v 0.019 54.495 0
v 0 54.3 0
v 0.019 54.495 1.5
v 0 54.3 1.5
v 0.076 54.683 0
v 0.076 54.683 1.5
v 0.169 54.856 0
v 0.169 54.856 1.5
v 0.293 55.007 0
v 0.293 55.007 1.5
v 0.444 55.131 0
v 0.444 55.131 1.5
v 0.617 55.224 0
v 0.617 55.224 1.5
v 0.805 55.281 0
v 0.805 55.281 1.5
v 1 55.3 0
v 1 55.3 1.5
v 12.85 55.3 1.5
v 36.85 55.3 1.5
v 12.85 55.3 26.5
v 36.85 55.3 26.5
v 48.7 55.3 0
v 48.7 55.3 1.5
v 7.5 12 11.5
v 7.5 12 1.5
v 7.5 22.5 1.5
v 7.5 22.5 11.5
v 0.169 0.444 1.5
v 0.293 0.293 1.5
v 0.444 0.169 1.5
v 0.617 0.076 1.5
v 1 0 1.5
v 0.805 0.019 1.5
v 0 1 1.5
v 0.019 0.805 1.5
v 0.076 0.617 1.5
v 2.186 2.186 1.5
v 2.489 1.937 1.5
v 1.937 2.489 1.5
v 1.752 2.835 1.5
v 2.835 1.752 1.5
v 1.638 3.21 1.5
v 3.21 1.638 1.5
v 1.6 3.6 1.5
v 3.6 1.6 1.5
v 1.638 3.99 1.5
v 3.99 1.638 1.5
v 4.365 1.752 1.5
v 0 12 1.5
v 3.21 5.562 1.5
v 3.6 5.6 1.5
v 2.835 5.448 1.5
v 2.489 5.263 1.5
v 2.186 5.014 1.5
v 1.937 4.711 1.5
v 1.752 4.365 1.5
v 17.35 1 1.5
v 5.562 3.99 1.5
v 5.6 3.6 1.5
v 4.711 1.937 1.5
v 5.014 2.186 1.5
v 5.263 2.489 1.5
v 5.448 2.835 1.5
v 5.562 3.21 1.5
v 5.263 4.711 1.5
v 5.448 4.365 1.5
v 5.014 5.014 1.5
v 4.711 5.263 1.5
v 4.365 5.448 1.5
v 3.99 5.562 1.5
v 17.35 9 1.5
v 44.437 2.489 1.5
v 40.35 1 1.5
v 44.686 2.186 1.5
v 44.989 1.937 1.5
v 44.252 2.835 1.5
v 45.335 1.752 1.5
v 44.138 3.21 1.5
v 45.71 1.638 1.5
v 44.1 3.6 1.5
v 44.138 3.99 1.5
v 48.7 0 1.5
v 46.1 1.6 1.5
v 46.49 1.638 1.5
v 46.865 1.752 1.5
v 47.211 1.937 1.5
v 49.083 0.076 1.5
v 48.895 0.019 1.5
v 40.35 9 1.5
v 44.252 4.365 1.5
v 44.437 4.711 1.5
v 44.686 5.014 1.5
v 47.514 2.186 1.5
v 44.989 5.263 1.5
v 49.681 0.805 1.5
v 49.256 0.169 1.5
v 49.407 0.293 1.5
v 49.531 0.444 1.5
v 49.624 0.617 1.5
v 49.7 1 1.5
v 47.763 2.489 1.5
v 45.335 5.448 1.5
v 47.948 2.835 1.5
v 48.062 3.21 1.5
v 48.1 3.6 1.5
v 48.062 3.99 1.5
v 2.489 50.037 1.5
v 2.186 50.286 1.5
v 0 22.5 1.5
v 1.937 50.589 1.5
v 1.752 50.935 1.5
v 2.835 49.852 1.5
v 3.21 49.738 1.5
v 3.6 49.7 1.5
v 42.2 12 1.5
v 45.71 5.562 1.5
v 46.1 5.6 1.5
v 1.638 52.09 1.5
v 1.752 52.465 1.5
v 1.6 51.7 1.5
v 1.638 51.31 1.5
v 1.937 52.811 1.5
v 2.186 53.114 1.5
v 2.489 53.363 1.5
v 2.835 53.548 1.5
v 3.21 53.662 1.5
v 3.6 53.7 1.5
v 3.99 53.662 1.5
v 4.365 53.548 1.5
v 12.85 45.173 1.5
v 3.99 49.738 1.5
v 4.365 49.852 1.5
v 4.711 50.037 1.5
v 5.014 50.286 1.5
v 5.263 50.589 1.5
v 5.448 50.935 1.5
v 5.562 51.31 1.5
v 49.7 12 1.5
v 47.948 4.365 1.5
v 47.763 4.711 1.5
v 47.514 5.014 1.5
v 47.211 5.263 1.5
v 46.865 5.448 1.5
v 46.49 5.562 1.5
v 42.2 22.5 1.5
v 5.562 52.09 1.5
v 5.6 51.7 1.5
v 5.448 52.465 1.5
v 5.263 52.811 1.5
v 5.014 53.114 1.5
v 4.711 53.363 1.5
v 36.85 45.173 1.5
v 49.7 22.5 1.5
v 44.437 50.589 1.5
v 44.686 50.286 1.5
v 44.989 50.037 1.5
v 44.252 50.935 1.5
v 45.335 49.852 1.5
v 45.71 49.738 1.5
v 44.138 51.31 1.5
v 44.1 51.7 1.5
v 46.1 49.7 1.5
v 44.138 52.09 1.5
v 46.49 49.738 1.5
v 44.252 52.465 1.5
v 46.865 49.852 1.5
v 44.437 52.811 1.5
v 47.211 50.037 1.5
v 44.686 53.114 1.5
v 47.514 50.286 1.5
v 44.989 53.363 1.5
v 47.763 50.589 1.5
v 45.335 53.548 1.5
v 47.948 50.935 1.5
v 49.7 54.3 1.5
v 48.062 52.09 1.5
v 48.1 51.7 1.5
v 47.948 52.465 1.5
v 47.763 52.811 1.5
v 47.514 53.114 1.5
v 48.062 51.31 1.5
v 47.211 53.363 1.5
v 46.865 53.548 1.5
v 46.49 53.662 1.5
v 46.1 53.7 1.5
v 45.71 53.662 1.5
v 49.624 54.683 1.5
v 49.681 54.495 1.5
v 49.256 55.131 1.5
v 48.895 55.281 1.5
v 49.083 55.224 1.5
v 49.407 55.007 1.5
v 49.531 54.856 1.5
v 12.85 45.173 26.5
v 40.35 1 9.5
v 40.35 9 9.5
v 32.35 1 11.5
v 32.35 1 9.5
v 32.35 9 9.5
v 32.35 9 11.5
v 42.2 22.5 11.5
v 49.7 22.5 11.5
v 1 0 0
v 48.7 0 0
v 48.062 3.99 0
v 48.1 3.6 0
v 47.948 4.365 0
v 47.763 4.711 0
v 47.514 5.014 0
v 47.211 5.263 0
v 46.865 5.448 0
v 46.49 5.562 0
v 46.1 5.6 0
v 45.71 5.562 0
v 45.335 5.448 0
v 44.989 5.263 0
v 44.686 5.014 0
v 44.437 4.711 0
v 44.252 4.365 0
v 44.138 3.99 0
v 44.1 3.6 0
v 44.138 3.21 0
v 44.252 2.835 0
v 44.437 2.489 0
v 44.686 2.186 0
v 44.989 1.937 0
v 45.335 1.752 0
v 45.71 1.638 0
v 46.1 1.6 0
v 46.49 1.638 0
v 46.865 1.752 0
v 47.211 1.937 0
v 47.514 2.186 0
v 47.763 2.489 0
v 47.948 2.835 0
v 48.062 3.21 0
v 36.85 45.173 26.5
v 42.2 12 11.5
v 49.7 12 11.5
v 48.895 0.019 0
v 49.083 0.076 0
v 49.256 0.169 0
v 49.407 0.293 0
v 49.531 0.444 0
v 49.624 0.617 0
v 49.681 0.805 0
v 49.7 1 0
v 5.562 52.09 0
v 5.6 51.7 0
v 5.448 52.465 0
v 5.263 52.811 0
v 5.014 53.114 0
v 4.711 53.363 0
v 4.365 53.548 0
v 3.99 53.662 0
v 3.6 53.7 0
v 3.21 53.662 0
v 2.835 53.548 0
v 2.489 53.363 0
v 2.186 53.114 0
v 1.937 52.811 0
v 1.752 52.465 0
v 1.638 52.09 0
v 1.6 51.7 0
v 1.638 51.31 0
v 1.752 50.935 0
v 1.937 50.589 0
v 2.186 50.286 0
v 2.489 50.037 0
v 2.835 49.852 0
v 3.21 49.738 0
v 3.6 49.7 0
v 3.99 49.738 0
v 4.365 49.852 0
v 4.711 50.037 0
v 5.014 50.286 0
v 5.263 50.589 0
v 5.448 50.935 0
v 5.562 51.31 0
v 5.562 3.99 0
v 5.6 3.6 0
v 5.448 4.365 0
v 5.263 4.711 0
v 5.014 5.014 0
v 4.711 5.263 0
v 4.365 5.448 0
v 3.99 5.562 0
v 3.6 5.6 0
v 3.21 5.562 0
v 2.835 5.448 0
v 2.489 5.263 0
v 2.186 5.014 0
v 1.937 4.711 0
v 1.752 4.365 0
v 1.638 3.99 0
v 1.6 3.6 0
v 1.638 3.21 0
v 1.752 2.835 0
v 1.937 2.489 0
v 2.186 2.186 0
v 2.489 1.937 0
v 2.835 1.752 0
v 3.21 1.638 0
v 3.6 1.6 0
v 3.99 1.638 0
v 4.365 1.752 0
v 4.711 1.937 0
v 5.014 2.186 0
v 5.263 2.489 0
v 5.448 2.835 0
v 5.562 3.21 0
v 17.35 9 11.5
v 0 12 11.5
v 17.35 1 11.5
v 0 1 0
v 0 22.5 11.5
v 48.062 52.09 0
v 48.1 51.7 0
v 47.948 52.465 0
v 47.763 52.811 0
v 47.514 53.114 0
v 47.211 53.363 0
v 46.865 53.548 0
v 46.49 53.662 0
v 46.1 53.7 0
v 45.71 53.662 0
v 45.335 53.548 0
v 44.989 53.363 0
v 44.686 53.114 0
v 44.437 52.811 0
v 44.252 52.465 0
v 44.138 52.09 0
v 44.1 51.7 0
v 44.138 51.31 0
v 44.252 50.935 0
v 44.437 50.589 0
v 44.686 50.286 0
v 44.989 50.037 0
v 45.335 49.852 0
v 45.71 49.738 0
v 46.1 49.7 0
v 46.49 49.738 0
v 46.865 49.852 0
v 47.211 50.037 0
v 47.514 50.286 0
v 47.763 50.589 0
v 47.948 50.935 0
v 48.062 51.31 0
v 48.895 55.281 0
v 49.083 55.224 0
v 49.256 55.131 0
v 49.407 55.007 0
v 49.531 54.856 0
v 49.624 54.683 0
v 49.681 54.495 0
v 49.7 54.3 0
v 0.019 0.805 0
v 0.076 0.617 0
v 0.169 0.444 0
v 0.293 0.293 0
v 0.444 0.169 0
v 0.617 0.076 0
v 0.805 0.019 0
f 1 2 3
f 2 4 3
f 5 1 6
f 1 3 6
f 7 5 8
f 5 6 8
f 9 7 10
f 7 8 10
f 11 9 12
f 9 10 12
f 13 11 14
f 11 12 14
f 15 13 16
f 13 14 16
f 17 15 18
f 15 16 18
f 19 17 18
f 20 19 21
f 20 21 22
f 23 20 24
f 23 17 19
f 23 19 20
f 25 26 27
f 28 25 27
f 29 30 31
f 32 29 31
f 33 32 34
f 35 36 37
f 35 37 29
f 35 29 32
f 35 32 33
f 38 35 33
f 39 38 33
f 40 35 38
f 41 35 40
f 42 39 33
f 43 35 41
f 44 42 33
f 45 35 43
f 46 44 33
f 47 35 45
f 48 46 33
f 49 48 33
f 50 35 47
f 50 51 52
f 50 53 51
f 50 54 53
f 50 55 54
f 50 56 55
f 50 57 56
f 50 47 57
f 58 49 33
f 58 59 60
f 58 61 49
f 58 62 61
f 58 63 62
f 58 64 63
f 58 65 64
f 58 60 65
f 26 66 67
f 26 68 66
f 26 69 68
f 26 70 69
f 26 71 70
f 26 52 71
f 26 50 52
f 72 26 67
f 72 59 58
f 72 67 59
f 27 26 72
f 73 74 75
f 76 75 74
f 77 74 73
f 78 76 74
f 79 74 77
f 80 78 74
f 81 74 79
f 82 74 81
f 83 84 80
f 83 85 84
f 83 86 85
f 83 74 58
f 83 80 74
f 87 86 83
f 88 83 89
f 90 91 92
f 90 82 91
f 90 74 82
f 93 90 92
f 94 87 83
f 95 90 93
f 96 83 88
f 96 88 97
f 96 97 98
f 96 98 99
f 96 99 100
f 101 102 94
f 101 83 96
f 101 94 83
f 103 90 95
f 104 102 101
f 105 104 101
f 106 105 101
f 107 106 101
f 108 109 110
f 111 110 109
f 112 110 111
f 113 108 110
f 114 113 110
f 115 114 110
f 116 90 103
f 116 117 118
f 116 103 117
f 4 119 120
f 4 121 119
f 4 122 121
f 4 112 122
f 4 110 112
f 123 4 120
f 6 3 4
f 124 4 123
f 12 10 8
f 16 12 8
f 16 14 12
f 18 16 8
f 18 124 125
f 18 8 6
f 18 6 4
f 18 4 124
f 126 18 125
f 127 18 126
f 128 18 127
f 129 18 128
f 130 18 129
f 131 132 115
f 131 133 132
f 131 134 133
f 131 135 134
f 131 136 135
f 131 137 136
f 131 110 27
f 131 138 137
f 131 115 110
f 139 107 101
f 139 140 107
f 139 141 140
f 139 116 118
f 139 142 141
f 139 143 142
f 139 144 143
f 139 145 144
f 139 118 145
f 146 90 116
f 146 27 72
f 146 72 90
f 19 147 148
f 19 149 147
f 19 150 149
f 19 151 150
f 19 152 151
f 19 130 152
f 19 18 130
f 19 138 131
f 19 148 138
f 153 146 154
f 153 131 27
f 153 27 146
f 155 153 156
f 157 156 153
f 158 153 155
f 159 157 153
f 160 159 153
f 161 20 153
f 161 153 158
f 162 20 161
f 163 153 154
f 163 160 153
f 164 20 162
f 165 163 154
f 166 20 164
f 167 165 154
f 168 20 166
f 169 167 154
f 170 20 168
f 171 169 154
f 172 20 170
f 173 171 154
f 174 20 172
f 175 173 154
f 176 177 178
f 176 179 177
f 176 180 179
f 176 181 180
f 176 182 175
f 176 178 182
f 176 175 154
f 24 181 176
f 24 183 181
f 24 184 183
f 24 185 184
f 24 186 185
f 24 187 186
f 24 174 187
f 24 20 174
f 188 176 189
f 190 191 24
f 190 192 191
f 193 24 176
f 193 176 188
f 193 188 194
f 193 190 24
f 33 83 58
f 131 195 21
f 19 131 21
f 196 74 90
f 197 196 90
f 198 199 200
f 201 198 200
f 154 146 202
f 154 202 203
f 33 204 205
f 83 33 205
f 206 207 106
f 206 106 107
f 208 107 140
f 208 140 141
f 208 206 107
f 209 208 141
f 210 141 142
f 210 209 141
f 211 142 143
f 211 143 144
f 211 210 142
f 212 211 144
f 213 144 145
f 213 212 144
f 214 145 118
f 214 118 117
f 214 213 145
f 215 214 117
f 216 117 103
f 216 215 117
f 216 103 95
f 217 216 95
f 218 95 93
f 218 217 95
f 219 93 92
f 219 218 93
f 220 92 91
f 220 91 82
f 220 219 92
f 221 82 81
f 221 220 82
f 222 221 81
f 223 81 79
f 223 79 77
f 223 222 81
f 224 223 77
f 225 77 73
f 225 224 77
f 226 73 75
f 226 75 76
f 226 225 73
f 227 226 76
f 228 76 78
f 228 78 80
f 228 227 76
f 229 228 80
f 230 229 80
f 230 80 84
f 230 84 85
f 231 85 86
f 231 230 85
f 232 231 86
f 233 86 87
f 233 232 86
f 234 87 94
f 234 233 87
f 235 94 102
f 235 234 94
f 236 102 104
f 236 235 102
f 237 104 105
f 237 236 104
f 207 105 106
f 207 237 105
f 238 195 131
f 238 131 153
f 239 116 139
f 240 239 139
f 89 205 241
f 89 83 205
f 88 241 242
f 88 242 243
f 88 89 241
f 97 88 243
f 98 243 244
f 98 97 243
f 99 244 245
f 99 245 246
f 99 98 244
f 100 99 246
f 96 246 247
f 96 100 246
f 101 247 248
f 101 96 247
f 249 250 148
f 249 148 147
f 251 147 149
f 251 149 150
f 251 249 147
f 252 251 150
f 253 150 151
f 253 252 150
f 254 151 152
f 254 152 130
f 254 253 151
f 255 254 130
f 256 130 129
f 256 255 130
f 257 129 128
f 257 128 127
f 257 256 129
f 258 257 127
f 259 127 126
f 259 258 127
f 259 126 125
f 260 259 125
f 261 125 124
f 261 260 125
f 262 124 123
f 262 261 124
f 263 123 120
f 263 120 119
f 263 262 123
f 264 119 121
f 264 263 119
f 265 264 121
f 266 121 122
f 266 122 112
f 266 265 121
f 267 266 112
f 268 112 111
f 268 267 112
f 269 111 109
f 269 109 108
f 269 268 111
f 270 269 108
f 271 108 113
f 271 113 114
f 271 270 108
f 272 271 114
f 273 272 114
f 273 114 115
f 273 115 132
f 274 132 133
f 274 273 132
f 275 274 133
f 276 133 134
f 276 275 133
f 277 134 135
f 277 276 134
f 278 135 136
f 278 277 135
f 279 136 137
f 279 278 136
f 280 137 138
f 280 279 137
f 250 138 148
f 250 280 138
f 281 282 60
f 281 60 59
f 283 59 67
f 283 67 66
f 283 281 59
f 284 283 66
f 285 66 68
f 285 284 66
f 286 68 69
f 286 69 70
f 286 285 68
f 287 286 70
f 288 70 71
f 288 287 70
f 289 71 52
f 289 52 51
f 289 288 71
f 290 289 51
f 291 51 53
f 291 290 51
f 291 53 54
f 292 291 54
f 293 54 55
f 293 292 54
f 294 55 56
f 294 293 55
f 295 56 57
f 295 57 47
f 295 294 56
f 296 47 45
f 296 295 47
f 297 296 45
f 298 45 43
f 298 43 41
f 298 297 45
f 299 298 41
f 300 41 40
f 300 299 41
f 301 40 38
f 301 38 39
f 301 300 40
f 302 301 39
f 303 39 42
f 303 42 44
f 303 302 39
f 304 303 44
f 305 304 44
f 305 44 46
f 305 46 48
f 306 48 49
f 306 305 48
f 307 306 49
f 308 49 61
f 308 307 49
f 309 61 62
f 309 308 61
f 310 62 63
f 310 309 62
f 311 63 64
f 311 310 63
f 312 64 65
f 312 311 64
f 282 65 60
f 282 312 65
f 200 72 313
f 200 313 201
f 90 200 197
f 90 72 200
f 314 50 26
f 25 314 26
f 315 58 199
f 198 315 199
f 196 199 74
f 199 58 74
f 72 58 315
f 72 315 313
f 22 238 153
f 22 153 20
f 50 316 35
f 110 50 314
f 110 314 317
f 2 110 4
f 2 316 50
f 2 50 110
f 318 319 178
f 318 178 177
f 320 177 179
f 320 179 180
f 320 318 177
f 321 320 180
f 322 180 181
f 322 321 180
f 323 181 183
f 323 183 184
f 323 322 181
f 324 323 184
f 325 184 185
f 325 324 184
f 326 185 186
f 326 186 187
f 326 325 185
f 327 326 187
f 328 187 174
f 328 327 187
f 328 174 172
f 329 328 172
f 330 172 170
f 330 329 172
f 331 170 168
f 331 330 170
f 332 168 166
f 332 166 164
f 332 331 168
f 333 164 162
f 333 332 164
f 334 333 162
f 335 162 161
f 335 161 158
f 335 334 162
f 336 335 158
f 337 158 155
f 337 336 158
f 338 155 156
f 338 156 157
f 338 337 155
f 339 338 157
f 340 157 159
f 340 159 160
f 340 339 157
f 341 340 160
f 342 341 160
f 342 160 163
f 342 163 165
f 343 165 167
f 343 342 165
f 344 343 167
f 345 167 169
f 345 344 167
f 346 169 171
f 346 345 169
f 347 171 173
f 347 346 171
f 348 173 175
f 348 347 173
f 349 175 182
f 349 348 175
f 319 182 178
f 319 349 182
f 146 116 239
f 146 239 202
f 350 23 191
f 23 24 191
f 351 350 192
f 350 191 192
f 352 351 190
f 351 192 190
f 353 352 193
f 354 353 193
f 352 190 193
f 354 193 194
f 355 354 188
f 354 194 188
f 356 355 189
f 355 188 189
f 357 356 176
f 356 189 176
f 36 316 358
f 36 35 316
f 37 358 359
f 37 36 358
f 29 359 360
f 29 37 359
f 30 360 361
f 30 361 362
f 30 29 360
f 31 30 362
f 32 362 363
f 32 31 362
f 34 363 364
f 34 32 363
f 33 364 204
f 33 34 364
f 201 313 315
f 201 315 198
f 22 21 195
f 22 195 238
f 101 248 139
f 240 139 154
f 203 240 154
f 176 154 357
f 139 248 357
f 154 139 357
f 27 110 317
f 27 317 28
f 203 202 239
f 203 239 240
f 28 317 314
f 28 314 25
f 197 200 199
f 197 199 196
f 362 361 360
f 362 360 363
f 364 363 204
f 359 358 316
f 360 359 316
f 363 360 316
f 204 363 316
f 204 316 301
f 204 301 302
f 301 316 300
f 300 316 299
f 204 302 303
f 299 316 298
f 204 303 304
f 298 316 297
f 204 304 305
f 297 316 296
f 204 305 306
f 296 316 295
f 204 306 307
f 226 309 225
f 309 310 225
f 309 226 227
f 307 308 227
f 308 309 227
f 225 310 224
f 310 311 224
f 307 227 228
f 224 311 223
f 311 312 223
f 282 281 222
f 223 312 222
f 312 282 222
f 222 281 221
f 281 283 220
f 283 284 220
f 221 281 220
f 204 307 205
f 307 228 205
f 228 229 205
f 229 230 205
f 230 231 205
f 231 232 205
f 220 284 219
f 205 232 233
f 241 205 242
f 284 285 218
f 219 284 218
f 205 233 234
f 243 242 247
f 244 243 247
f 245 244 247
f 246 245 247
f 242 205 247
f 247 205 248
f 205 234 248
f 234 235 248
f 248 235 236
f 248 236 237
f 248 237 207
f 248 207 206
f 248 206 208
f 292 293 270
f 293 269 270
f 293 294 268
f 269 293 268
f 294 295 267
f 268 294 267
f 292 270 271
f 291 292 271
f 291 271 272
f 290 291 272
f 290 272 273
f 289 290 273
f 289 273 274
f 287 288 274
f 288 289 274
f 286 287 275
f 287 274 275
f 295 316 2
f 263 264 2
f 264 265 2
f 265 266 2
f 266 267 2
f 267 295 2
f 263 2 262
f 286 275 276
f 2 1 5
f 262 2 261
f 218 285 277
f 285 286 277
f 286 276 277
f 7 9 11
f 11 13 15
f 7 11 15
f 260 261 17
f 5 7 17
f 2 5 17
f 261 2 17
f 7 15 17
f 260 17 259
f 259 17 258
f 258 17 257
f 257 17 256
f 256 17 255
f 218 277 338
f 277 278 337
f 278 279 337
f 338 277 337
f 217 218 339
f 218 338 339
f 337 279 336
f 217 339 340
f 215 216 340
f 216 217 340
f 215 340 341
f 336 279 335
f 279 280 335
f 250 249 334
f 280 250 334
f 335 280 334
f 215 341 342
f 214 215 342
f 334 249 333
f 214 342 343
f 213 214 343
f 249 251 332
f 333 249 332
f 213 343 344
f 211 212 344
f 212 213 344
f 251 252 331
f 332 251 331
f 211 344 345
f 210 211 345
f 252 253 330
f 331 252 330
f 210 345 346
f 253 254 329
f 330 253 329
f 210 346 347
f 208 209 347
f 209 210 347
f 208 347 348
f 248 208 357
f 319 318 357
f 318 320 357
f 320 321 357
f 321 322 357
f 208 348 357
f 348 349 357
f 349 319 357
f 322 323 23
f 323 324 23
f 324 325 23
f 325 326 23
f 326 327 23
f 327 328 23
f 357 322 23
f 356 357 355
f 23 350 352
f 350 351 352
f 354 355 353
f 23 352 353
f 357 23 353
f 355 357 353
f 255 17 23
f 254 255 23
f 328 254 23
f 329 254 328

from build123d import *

# Parameters (mm, degrees)
ESQUISSE1_W        = 49.7
ESQUISSE1_H        = 55.3
ESQUISSE1_R        = 2
BOSS_EXTRU_1_DEPTH = 1.5
CONG_1_R           = 1
ESQUISSE2_W        = 24
ESQUISSE2_H        = 10.127456192
BOSS_EXTRU_2_DEPTH = 25
ESQUISSE3_W        = 7.5
ESQUISSE3_H        = 10.5
BOSS_EXTRU_3_DEPTH = 10
ESQUISSE4_W        = 15
ESQUISSE4_H        = 8
BOSS_EXTRU_4_DEPTH = 10
ESQUISSE5_W        = 8
ESQUISSE5_H        = 8
BOSS_EXTRU_5_DEPTH = 8


with BuildPart() as part:
    # Esquisse1 → Boss.-Extru.1 (new body)
    with BuildSketch(Plane.XY):
        with Locations((24.85, 27.65)):
            Rectangle(ESQUISSE1_W, ESQUISSE1_H)
        with Locations((3.6, 51.7)):
            Circle(ESQUISSE1_R, mode=Mode.SUBTRACT)
        with Locations((46.1, 51.7)):
            Circle(ESQUISSE1_R, mode=Mode.SUBTRACT)
        with Locations((46.1, 3.6)):
            Circle(ESQUISSE1_R, mode=Mode.SUBTRACT)
        with Locations((3.6, 3.6)):
            Circle(ESQUISSE1_R, mode=Mode.SUBTRACT)
    extrude(amount=BOSS_EXTRU_1_DEPTH)

    # Congé1
    cong_1_edges = [part.edges().sort_by_distance(p)[0] for p in [
        (0, 55.3, 0.75),
        (49.7, 55.3, 0.75),
        (49.7, 0, 0.75),
        (0, 0, 0.75),
    ]]
    fillet(cong_1_edges, radius=CONG_1_R)

    # Esquisse2 → Boss.-Extru.2 (add)
    with BuildSketch(Plane.XY.offset(1.5)):
        with Locations((24.85, 50.236271904)):
            Rectangle(ESQUISSE2_W, ESQUISSE2_H)
    extrude(amount=BOSS_EXTRU_2_DEPTH)

    # Esquisse3 → Boss.-Extru.3 (add)
    with BuildSketch(Plane.XY.offset(1.5)):
        with Locations((3.75, 17.25)):
            Rectangle(ESQUISSE3_W, ESQUISSE3_H)
        with Locations((45.95, 17.25)):
            Rectangle(ESQUISSE3_W, ESQUISSE3_H)
    extrude(amount=BOSS_EXTRU_3_DEPTH)

    # Esquisse4 → Boss.-Extru.4 (add)
    with BuildSketch(Plane.XY.offset(1.5)):
        with Locations((24.85, 5)):
            Rectangle(ESQUISSE4_W, ESQUISSE4_H)
    extrude(amount=BOSS_EXTRU_4_DEPTH)

    # Esquisse5 → Boss.-Extru.5 (add)
    with BuildSketch(Plane.XY.offset(1.5)):
        with Locations((36.35, 5)):
            Rectangle(ESQUISSE5_W, ESQUISSE5_H)
    extrude(amount=BOSS_EXTRU_5_DEPTH)


solid = part.part
